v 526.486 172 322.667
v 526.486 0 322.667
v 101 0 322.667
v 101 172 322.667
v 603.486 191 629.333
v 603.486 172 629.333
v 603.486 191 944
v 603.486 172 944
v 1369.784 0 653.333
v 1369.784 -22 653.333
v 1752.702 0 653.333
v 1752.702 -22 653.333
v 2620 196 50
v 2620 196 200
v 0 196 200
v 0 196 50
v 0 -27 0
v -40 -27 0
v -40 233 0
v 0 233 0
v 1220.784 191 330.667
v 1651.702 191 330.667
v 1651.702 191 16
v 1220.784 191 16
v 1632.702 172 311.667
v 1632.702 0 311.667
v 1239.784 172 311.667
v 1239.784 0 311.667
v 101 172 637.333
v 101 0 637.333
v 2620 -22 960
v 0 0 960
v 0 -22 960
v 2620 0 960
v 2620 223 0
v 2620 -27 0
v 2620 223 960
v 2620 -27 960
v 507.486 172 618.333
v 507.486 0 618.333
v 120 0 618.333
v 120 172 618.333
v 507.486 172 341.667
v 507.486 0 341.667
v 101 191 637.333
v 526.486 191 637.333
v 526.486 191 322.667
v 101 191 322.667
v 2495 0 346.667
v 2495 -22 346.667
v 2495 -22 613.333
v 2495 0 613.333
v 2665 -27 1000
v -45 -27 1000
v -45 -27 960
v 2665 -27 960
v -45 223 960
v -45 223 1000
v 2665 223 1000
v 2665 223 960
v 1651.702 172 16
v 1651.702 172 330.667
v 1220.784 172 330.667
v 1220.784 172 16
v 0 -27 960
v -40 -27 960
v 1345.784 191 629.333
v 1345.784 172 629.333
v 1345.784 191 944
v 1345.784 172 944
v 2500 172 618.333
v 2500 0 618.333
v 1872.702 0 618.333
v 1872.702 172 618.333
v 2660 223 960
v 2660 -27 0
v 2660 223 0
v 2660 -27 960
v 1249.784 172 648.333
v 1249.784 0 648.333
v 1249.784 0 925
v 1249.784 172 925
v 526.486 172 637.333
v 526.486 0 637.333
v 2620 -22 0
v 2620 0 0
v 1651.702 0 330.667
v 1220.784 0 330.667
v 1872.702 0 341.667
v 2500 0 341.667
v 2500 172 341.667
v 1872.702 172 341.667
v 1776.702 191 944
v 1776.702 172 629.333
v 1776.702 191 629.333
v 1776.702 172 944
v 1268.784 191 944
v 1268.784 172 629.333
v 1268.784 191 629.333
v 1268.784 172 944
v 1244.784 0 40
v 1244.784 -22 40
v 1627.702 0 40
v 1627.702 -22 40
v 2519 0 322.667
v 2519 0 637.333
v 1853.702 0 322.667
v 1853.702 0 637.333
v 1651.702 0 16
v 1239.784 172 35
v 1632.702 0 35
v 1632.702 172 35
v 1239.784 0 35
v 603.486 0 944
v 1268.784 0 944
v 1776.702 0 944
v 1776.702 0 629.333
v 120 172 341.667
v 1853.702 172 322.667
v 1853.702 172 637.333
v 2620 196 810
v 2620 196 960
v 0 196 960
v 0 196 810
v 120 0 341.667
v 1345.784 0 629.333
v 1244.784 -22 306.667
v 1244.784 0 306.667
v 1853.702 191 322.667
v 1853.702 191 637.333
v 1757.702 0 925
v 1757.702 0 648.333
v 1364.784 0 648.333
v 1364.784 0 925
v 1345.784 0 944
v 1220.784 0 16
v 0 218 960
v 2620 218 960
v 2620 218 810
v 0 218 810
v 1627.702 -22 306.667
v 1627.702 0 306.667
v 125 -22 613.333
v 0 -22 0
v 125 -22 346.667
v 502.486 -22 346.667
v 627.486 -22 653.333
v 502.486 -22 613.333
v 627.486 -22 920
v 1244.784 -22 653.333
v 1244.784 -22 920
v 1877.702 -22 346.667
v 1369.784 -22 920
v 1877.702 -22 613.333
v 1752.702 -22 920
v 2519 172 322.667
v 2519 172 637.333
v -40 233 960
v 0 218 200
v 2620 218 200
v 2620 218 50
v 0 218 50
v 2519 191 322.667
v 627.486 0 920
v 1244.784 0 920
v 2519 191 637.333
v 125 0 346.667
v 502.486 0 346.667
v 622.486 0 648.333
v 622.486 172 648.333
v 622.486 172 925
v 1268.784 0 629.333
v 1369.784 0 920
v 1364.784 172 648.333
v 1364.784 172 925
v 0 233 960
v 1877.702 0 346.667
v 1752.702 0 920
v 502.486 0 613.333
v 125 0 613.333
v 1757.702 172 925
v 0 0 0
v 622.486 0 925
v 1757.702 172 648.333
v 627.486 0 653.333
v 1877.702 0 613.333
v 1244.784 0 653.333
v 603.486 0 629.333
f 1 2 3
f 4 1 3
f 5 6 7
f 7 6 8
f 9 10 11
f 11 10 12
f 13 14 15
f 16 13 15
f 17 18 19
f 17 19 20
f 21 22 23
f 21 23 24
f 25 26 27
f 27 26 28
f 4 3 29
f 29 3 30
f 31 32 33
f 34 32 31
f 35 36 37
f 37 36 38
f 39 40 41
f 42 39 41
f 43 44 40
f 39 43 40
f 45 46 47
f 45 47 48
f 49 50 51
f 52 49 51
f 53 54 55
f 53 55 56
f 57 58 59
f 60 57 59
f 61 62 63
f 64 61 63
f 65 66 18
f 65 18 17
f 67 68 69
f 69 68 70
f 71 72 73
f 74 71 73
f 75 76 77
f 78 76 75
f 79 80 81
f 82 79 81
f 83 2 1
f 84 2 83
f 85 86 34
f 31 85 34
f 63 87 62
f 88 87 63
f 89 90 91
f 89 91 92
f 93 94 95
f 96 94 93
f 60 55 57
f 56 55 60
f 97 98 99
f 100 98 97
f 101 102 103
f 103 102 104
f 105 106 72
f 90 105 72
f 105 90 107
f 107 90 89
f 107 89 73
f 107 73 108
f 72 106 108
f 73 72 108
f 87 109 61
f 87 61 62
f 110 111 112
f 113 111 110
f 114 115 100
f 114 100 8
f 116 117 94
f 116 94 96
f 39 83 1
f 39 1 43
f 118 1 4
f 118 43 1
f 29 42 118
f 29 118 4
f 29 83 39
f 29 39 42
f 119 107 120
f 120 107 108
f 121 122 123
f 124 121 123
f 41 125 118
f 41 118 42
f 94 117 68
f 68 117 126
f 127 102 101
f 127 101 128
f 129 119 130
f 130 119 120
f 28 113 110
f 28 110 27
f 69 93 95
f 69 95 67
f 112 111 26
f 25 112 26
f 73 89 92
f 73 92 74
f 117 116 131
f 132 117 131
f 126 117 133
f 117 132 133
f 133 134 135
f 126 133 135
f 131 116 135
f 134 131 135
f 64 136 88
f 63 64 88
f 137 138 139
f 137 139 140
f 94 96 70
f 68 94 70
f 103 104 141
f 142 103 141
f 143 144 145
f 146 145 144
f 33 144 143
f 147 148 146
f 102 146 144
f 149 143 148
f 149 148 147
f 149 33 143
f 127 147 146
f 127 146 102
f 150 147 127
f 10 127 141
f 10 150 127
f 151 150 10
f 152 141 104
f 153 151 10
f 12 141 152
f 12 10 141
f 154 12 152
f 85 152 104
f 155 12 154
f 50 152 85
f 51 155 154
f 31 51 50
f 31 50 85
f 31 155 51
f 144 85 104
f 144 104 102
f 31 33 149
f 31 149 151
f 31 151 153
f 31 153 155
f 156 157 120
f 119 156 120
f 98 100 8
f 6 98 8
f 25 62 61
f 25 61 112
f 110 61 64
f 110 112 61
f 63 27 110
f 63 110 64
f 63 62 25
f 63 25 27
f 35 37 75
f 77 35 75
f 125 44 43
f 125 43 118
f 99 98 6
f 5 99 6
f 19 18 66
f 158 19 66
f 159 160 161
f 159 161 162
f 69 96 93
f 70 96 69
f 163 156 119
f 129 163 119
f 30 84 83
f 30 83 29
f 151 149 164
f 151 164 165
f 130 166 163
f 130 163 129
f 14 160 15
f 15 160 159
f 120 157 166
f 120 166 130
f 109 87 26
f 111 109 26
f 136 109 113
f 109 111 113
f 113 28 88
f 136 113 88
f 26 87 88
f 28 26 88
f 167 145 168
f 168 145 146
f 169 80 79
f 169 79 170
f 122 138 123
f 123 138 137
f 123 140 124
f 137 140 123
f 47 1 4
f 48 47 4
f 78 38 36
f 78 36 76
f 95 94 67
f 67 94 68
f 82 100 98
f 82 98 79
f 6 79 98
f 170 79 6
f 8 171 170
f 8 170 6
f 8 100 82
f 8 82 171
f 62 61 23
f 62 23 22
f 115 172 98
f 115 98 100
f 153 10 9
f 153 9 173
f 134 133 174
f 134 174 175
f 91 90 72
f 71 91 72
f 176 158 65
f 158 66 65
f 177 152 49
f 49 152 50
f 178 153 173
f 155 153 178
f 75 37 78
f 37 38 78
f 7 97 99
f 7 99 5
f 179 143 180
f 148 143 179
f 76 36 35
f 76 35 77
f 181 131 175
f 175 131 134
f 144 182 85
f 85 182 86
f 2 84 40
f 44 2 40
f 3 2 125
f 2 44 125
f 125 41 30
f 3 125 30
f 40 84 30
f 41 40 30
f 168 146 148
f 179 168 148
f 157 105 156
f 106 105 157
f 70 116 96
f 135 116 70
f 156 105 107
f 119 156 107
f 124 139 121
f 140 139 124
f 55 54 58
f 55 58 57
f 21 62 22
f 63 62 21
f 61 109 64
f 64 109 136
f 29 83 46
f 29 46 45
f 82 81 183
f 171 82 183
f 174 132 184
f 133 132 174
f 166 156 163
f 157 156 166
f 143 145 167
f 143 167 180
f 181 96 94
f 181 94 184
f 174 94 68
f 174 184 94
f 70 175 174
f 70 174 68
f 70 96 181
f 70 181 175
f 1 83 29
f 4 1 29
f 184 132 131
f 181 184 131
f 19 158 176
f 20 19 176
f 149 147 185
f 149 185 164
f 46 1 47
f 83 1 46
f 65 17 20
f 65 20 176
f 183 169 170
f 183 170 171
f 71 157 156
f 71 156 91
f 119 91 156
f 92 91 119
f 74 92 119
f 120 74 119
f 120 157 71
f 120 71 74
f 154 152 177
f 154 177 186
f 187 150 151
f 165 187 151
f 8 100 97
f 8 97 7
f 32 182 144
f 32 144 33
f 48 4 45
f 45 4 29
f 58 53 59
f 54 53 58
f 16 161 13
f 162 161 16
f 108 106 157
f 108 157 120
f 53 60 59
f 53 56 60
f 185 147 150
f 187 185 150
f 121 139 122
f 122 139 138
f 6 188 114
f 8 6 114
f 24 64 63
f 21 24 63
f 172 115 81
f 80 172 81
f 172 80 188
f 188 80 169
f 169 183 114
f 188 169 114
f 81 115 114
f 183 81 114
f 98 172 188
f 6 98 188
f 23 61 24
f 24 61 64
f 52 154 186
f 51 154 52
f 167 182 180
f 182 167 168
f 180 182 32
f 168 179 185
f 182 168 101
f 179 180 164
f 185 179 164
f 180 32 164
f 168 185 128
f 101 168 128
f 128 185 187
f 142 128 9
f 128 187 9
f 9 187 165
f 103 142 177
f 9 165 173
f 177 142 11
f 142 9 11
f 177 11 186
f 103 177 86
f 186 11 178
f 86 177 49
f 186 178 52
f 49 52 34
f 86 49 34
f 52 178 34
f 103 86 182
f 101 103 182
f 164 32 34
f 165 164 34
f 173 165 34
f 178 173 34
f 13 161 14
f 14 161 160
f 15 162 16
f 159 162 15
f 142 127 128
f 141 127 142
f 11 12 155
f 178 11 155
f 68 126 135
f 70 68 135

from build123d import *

# Parameters (mm, degrees)
F1_W          = 2620
F1_H          = 960
F2_DEPTH      = 22
F3_W          = 377.4858117104
F3_H          = 266.6666666667
F3_W_2        = 617.2977089882
F3_W_3        = 382.9187703133
F4_DEPTH      = 22
F5_W          = 40
F5_H          = 960
F6_DEPTH      = 5
F6_DEPTH_BACK = 255
F7_DEPTH      = 5
F7_DEPTH_BACK = 245
F8_DEPTH      = 5
F8_DEPTH_BACK = 245
F9_W          = 665.2977089882
F9_H          = 314.6666666667
F9_W_2        = 627.2977089882
F9_H_2        = 276.6666666667
F10_DEPTH     = 172
F9_W_3        = 430.9187703133
F9_W_4        = 392.9187703133
F9_W_5        = 425.4858117104
F9_W_6        = 387.4858117104
F11_W         = 665.2977089882
F11_H         = 314.6666666667
F12_DEPTH     = 19
F11_W_2       = 430.9187703133
F11_W_3       = 425.4858117104
F14_W         = 2620
F14_H         = 150
F15_DEPTH     = 22


with BuildPart() as f2:
    # F1 (on Front) → F2 (new body)
    with BuildSketch(Plane.XZ):
        with Locations((1310, 480)):
            Rectangle(F1_W, F1_H)
    extrude(amount=F2_DEPTH)

    # F3 (on face) → F4 (cut, through all)
    with BuildSketch(Plane.XZ.offset(22)):
        with Locations((313.7429058552, 480)):
            Rectangle(F3_W, F3_H)
        with Locations((936.1346662045, 786.6666666667)):
            Rectangle(F3_W_2, F3_H)
        with Locations((1561.2429058552, 786.6666666667)):
            Rectangle(F3_W_3, F3_H)
        with Locations((1436.2429058552, 173.3333333333)):
            Rectangle(F3_W_3, F3_H)
        with Locations((2186.3511455059, 480)):
            Rectangle(F3_W_2, F3_H)
    extrude(amount=-F4_DEPTH, mode=Mode.SUBTRACT)


with BuildPart() as f6:
    # F5 (on face) → F6 (new body, two sides)
    with BuildSketch(Plane.XZ.offset(22)) as f6_sk:
        with Locations((-20, 480)):
            Rectangle(F5_W, F5_H)
    extrude(amount=F6_DEPTH)
    extrude(f6_sk.sketch, amount=-F6_DEPTH_BACK)


with BuildPart() as f7:
    # F5 (on face) → F7 (new body, two sides)
    with BuildSketch(Plane.XZ.offset(22)) as f7_sk:
        with Locations((2640, 480)):
            Rectangle(F5_W, F5_H)
    extrude(amount=F7_DEPTH)
    extrude(f7_sk.sketch, amount=-F7_DEPTH_BACK)


with BuildPart() as f8:
    # F5 (on face) → F8 (new body, two sides)
    with BuildSketch(Plane.XZ.offset(22)) as f8_sk:
        Polygon((2665, 1000), (-45, 1000), (-45, 960), (-40, 960), (0, 960), (2620, 960), (2660, 960), (2665, 960), align=None)
    extrude(amount=F8_DEPTH)
    extrude(f8_sk.sketch, amount=-F8_DEPTH_BACK)


with BuildPart() as f10:
    # F9 (on face) → F10 (new body)
    with BuildSketch(Plane(origin=(0, 0, 0), x_dir=(-1, 0, 0), z_dir=(0, 1, 0))):
        with Locations((-2186.3511455059, 480)):
            Rectangle(F9_W, F9_H)
        with Locations((-2186.3511455059, 480)):
            Rectangle(F9_W_2, F9_H_2, mode=Mode.SUBTRACT)
    extrude(amount=F10_DEPTH)


with BuildPart() as f10b:
    # F9 (on face) → F10, piece 2 (new body)
    with BuildSketch(Plane(origin=(0, 0, 0), x_dir=(-1, 0, 0), z_dir=(0, 1, 0))):
        with Locations((-1561.2429058552, 786.6666666667)):
            Rectangle(F9_W_3, F9_H)
        with Locations((-1561.2429058552, 786.6666666667)):
            Rectangle(F9_W_4, F9_H_2, mode=Mode.SUBTRACT)
    extrude(amount=F10_DEPTH)


with BuildPart() as f10c:
    # F9 (on face) → F10, piece 3 (new body)
    with BuildSketch(Plane(origin=(0, 0, 0), x_dir=(-1, 0, 0), z_dir=(0, 1, 0))):
        with Locations((-936.1346662045, 786.6666666667)):
            Rectangle(F9_W, F9_H)
        with Locations((-936.1346662045, 786.6666666667)):
            Rectangle(F9_W_2, F9_H_2, mode=Mode.SUBTRACT)
    extrude(amount=F10_DEPTH)


with BuildPart() as f10d:
    # F9 (on face) → F10, piece 4 (new body)
    with BuildSketch(Plane(origin=(0, 0, 0), x_dir=(-1, 0, 0), z_dir=(0, 1, 0))):
        with Locations((-313.7429058552, 480)):
            Rectangle(F9_W_5, F9_H)
        with Locations((-313.7429058552, 480)):
            Rectangle(F9_W_6, F9_H_2, mode=Mode.SUBTRACT)
    extrude(amount=F10_DEPTH)


with BuildPart() as f10e:
    # F9 (on face) → F10, piece 5 (new body)
    with BuildSketch(Plane(origin=(0, 0, 0), x_dir=(-1, 0, 0), z_dir=(0, 1, 0))):
        with Locations((-1436.2429058552, 173.3333333333)):
            Rectangle(F9_W_3, F9_H)
        with Locations((-1436.2429058552, 173.3333333333)):
            Rectangle(F9_W_4, F9_H_2, mode=Mode.SUBTRACT)
    extrude(amount=F10_DEPTH)


with BuildPart() as f12:
    # F11 (on face) → F12 (new body)
    with BuildSketch(Plane(origin=(0, 172, 0), x_dir=(-1, 0, 0), z_dir=(0, 1, 0))):
        with Locations((-2186.3511455059, 480)):
            Rectangle(F11_W, F11_H)
    extrude(amount=F12_DEPTH)


with BuildPart() as f12b:
    # F11 (on face) → F12, piece 2 (new body)
    with BuildSketch(Plane(origin=(0, 172, 0), x_dir=(-1, 0, 0), z_dir=(0, 1, 0))):
        with Locations((-1561.2429058552, 786.6666666667)):
            Rectangle(F11_W_2, F11_H)
    extrude(amount=F12_DEPTH)


with BuildPart() as f12c:
    # F11 (on face) → F12, piece 3 (new body)
    with BuildSketch(Plane(origin=(0, 172, 0), x_dir=(-1, 0, 0), z_dir=(0, 1, 0))):
        with Locations((-936.1346662045, 786.6666666667)):
            Rectangle(F11_W, F11_H)
    extrude(amount=F12_DEPTH)


with BuildPart() as f12d:
    # F11 (on face) → F12, piece 4 (new body)
    with BuildSketch(Plane(origin=(0, 172, 0), x_dir=(-1, 0, 0), z_dir=(0, 1, 0))):
        with Locations((-1436.2429058552, 173.3333333333)):
            Rectangle(F11_W_2, F11_H)
    extrude(amount=F12_DEPTH)


with BuildPart() as f12e:
    # F11 (on face) → F12, piece 5 (new body)
    with BuildSketch(Plane(origin=(0, 172, 0), x_dir=(-1, 0, 0), z_dir=(0, 1, 0))):
        with Locations((-313.7429058552, 480)):
            Rectangle(F11_W_3, F11_H)
    extrude(amount=F12_DEPTH)


with BuildPart() as f15:
    # F14 (on offset) → F15 (new body)
    with BuildSketch(Plane(origin=(0, 218, 0), x_dir=(-1, 0, 0), z_dir=(0, 1, 0))):
        with Locations((-1310, 885)):
            Rectangle(F14_W, F14_H)
    extrude(amount=-F15_DEPTH)


with BuildPart() as f15b:
    # F14 (on offset) → F15, piece 2 (new body)
    with BuildSketch(Plane(origin=(0, 218, 0), x_dir=(-1, 0, 0), z_dir=(0, 1, 0))):
        with Locations((-1310, 125)):
            Rectangle(F14_W, F14_H)
    extrude(amount=-F15_DEPTH)


solid = Compound([f2.part, f6.part, f7.part, f8.part, f10.part, f10b.part, f10c.part, f10d.part, f10e.part, f12.part, f12b.part, f12c.part, f12d.part, f12e.part, f15.part, f15b.part])
